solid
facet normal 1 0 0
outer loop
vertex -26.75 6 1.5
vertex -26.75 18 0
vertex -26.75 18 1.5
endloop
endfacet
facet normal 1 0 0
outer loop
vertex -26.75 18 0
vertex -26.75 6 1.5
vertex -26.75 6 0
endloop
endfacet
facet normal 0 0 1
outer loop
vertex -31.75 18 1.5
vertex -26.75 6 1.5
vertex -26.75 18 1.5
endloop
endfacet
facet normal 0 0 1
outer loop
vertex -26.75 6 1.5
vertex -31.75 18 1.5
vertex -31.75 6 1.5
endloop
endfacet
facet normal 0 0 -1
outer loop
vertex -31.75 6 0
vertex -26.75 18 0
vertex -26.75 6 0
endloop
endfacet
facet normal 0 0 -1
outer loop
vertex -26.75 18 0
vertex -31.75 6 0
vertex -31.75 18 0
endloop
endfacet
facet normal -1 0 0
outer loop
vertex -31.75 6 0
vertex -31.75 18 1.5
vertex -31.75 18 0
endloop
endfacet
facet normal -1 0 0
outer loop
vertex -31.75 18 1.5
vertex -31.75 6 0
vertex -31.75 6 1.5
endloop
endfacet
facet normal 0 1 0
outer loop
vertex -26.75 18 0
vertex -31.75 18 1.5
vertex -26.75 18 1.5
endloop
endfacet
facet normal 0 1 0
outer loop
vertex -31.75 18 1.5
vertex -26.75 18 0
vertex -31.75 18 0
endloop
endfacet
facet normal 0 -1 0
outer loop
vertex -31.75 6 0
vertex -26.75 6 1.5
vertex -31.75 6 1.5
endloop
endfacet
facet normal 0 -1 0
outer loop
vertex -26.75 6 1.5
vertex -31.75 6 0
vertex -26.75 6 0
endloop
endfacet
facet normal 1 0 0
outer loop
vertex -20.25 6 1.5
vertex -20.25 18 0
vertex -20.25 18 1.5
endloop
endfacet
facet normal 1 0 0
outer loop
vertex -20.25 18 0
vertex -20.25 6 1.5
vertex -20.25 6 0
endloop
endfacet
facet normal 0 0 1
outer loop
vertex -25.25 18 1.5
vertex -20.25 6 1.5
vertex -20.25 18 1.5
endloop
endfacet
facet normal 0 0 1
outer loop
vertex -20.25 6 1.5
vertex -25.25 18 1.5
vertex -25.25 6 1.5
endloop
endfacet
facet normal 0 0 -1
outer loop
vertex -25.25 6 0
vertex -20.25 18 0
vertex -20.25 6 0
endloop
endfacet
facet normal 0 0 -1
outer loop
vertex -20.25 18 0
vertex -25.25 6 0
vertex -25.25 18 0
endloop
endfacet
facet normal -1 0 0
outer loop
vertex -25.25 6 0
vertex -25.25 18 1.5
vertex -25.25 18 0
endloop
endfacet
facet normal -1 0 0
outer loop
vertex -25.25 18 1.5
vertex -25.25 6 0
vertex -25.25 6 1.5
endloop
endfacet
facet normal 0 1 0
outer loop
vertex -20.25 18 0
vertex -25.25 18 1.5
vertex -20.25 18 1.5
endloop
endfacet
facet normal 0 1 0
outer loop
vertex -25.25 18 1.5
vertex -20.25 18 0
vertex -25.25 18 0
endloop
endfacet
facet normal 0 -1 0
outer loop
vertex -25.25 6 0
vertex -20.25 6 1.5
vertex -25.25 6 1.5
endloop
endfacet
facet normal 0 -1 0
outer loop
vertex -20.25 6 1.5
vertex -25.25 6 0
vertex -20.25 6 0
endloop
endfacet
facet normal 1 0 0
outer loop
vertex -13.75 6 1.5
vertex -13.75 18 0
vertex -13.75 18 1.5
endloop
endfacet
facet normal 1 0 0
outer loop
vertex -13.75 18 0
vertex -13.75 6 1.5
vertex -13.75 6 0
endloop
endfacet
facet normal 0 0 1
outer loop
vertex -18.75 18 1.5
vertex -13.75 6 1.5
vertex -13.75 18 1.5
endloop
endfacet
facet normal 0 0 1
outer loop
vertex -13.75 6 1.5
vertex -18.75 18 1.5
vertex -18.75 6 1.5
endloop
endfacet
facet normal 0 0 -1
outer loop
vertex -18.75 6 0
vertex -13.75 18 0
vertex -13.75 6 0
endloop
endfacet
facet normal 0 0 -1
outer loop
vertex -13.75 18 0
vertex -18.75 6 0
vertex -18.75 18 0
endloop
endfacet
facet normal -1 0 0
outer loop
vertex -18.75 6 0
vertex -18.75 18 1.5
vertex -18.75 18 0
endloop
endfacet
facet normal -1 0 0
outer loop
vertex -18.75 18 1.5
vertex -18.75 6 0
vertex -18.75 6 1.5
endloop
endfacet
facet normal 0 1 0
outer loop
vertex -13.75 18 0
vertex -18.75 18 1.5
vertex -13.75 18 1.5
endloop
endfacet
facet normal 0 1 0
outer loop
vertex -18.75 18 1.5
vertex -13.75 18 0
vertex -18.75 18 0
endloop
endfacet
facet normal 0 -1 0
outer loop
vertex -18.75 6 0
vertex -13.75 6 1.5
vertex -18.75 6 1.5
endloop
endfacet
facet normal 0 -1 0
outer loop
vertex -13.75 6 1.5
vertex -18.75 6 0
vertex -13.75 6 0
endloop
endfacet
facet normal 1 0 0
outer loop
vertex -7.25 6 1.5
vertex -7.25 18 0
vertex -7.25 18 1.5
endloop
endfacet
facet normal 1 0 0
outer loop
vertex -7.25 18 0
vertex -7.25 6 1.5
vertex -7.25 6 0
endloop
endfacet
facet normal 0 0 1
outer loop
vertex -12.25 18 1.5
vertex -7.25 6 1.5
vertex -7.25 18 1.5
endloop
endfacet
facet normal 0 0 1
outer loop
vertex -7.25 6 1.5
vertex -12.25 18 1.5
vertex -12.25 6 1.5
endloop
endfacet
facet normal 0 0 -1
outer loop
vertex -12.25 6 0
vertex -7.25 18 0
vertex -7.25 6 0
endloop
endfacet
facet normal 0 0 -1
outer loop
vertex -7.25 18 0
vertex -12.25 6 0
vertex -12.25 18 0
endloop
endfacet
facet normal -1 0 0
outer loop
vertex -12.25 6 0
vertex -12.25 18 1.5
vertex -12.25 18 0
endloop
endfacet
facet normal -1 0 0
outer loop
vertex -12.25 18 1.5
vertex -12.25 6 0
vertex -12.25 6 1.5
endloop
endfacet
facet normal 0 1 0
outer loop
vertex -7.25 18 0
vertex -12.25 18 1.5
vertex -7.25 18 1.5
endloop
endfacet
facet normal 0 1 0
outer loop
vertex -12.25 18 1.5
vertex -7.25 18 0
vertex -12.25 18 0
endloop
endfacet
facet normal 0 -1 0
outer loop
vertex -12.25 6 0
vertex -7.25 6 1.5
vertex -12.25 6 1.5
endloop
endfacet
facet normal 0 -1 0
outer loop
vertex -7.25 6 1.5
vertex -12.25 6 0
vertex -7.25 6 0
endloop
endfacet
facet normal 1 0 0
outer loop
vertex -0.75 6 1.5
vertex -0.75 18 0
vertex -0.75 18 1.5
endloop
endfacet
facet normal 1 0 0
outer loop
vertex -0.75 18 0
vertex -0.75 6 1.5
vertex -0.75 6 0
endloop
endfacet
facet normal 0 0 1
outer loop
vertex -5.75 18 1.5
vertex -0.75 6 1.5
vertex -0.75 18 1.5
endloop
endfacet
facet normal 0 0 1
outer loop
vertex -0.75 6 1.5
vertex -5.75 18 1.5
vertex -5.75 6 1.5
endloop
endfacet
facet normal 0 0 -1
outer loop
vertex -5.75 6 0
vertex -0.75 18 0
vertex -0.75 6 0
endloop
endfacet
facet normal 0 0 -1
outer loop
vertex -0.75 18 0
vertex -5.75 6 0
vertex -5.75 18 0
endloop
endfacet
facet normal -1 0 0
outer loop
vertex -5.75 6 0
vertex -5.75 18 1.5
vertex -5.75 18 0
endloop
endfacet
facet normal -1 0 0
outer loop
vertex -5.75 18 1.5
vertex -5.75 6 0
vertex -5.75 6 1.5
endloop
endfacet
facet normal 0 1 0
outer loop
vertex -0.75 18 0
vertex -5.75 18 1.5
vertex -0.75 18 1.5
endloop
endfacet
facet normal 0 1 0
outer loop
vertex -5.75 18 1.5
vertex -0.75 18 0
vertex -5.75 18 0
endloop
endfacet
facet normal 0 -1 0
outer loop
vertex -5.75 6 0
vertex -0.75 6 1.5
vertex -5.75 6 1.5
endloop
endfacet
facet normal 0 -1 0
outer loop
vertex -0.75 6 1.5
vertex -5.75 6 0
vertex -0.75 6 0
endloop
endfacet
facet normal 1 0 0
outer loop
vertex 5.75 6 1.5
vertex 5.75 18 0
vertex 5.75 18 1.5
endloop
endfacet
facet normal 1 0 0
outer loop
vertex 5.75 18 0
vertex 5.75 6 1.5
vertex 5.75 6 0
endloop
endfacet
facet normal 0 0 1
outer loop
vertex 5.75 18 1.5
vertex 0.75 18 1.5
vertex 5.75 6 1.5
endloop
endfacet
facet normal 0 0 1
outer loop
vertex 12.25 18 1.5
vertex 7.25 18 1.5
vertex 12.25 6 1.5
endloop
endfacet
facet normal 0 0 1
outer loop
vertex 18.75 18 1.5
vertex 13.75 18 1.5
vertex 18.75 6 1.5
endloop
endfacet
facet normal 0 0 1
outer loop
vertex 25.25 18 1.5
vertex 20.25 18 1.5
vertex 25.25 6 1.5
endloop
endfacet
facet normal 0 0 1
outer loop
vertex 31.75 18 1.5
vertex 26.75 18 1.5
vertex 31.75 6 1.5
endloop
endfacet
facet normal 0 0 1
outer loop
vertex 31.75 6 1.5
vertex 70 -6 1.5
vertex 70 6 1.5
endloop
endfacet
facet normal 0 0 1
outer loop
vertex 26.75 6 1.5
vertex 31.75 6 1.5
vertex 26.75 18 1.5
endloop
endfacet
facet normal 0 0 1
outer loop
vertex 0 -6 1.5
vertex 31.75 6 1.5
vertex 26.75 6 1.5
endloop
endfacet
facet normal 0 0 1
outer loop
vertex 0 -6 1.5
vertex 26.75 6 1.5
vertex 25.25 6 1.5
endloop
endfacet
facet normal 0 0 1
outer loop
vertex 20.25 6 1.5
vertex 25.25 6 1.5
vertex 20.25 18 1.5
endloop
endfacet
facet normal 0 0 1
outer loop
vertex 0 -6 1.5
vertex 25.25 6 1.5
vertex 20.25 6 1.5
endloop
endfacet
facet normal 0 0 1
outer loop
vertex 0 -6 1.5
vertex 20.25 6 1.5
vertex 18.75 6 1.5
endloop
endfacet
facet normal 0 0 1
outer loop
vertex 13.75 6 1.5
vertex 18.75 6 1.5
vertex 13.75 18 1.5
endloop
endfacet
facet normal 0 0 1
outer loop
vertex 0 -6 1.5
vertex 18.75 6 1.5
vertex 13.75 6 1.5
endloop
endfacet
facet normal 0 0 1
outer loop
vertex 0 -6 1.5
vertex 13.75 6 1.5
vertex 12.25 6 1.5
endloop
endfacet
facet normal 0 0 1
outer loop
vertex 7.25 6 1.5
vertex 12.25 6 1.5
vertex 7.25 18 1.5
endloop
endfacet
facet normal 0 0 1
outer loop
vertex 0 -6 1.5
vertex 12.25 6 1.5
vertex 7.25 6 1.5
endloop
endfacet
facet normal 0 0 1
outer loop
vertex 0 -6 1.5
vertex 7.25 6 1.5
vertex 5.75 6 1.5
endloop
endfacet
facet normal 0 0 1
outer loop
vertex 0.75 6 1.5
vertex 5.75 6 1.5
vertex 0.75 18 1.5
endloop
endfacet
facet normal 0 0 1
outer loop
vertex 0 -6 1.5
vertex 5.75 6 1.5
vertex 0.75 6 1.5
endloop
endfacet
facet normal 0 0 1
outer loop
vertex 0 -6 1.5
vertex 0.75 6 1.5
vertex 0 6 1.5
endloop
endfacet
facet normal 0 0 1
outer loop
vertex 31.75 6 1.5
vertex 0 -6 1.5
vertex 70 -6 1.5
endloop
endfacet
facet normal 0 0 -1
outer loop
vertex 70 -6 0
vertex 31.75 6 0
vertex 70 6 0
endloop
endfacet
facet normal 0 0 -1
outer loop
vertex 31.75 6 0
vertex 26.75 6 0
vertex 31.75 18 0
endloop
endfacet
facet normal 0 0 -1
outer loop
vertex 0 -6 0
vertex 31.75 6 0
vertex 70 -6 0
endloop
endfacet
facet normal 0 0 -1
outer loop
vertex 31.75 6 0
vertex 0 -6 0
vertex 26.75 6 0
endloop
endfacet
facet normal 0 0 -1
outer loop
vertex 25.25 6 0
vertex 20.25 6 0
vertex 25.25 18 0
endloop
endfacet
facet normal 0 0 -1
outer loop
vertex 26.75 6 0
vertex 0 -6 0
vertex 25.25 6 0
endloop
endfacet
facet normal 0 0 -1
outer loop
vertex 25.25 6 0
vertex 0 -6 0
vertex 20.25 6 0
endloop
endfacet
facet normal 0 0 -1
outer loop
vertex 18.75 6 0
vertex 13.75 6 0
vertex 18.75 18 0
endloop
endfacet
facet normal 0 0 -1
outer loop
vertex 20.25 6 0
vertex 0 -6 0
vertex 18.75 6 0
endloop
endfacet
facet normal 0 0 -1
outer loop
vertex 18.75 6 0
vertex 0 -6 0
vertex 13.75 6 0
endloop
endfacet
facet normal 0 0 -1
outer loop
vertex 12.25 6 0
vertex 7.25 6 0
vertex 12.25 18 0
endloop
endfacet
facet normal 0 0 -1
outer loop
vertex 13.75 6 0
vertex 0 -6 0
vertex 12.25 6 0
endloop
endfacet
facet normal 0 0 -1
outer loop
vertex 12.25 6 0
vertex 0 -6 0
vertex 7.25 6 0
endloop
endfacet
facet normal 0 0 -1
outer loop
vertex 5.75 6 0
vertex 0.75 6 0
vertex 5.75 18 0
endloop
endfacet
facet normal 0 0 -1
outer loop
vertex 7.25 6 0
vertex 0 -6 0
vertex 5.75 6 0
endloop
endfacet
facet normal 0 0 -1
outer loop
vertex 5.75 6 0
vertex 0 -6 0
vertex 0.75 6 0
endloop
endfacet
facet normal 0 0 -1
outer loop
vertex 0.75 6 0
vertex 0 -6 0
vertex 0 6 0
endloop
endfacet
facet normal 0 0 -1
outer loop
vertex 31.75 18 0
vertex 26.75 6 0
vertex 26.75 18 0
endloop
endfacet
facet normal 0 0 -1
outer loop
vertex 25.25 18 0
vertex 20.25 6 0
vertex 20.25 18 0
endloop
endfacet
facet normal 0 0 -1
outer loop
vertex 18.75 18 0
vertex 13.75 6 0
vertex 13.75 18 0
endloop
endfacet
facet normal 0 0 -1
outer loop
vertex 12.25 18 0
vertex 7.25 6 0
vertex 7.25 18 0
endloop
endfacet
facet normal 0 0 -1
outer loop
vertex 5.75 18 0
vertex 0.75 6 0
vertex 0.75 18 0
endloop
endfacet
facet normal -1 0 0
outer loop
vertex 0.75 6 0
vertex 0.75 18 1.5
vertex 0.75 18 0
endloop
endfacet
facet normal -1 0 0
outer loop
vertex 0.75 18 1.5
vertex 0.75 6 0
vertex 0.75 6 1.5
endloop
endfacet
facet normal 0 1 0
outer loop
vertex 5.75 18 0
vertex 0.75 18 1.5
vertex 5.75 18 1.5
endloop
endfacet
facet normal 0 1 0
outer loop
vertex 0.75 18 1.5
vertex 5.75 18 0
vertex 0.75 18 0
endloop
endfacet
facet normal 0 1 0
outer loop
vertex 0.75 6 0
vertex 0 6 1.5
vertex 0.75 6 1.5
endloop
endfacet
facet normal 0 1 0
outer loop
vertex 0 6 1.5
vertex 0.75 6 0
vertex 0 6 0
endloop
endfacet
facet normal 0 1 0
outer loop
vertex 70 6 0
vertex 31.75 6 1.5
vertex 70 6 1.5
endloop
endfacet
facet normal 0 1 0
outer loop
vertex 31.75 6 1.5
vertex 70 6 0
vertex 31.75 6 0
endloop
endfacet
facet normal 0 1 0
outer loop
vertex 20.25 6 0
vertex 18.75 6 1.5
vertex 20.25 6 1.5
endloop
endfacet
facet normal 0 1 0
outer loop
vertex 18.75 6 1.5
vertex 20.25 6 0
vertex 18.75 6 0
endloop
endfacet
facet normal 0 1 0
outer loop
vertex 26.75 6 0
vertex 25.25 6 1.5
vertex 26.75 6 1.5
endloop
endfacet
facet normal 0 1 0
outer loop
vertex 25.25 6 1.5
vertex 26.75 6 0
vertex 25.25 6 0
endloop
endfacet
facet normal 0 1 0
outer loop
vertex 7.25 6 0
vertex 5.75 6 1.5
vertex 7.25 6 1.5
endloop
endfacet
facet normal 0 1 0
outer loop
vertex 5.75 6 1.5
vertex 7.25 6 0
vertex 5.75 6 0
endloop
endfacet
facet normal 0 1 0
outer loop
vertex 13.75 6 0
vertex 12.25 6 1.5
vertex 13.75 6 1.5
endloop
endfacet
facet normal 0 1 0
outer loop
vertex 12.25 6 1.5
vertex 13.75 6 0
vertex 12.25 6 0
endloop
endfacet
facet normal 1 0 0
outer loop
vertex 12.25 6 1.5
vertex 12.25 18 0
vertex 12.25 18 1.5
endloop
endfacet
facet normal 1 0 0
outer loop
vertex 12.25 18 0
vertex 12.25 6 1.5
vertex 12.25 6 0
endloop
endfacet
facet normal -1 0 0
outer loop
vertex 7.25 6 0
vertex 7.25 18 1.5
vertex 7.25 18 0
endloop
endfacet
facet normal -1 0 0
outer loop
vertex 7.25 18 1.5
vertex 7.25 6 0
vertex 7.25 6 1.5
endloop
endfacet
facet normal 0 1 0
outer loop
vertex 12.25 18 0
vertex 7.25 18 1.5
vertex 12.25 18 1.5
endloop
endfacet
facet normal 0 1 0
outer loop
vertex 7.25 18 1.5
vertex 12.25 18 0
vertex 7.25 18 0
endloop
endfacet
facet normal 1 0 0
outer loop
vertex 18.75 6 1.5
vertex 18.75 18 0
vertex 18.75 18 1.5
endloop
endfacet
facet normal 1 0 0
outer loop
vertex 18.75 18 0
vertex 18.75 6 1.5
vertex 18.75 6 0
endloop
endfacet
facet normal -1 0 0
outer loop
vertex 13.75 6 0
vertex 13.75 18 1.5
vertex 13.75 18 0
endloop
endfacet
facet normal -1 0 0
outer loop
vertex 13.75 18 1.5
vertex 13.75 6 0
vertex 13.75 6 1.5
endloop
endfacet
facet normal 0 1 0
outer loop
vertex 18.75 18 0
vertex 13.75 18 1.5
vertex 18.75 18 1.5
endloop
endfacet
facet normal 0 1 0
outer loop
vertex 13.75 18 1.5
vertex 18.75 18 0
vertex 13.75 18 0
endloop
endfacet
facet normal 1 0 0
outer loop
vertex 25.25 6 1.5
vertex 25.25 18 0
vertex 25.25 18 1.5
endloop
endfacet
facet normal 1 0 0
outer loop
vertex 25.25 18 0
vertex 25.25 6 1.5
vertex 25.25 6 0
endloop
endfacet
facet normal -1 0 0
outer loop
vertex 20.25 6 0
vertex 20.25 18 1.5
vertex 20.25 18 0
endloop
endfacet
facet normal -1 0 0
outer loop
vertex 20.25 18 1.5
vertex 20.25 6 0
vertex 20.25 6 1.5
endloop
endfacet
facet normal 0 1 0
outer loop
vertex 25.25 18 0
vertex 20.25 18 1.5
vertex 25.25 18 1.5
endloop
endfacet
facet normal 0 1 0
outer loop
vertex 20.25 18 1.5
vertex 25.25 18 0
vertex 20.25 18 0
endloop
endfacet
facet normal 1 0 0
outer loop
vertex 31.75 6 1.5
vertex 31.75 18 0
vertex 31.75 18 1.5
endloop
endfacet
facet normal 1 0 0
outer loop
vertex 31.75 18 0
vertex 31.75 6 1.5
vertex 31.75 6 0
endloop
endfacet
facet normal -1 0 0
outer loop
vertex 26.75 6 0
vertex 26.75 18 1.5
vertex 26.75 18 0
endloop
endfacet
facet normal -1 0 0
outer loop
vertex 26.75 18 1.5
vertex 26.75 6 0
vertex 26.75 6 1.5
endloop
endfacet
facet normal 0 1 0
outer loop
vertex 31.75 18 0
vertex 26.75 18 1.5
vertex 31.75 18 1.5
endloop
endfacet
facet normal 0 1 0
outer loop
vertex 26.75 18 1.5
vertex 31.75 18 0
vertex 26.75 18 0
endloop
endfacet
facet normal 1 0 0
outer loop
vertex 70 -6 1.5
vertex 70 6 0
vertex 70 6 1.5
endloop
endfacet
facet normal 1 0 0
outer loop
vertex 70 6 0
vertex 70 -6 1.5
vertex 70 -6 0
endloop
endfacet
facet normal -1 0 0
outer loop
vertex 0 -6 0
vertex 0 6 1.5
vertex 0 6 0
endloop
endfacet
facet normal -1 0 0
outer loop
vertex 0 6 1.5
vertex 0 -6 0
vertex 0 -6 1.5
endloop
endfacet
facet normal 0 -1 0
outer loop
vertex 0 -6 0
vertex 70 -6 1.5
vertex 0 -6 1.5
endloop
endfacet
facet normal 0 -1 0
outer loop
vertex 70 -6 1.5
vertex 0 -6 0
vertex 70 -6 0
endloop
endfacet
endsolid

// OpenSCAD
// 10-well agarose gel comb - flat plate with spine and hanging teeth.
// Orientation: Lying flat on XY plane, spine along X, teeth hanging in -Y.

// Dimensions
spine_len = 70;
spine_w   = 12;
plate_thk = 1.5;

tooth_w   = 5.0;
tooth_l   = 12;
tooth_gap = 1.5;
num_teeth = 10;

$fn = 64;

// Calculate total width of the tooth row
tooth_row_w = (num_teeth * tooth_w) + ((num_teeth - 1) * tooth_gap);

// Position the tooth row so it is centred on the spine in X
// The spine is from -spine_len/2 to +spine_len/2.
// The tooth row starts at x_start and ends at x_start + tooth_row_w.
// We want the midpoint of the tooth row to align with the spine's midpoint (0).
x_start = -tooth_row_w / 2;

// Calculate the Y position of the teeth.
// The spine top edge is at y = spine_w / 2.
// The teeth hang down from this edge.
// Tooth top is at spine_w / 2. Tooth bottom is at spine_w / 2 - tooth_l.
y_top = spine_w / 2;
y_bot = y_top - tooth_l;

// Build the spine (back bar)
// It is a rectangle extruded to thickness.
// Centred at origin.
translate([0, -spine_w / 2, 0])
    cube([spine_len, spine_w, plate_thk]);

// Build the teeth
// We use a loop to create each tooth.
// The teeth are positioned along X.
// We use difference() to cut the teeth out of a larger block or union them?
// Actually, the prompt says "hang from one long edge".
// The spine is the main body. The teeth are additional material hanging down.
// So we can just union the spine with the teeth.

// However, to ensure clean geometry and avoid non-manifold issues if they touch,
// we can model the teeth as separate blocks and union them with the spine.
// Or, we can model the whole thing as one difference operation from a bounding box?
// No, union is safer for adding features.

// Let's create the teeth as a separate union and then union with the spine.
// Actually, since the teeth are attached to the spine, we can just union them all together.

// Define the tooth geometry
module tooth() {
    translate([0, y_top, 0])
        cube([tooth_w, tooth_l, plate_thk]);
}

// Generate the teeth positions
// We need to place them along X starting from x_start with spacing (tooth_w + tooth_gap).
// The loop variable i goes from 0 to num_teeth - 1.
// Position = x_start + i * (tooth_w + tooth_gap).

union() {
    // Spine
    translate([0, -spine_w / 2, 0])
        cube([spine_len, spine_w, plate_thk]);
    
    // Teeth
    for (i = [0 : num_teeth - 1]) {
        x_pos = x_start + i * (tooth_w + tooth_gap);
        translate([x_pos, 0, 0])
            tooth();
    }
}
